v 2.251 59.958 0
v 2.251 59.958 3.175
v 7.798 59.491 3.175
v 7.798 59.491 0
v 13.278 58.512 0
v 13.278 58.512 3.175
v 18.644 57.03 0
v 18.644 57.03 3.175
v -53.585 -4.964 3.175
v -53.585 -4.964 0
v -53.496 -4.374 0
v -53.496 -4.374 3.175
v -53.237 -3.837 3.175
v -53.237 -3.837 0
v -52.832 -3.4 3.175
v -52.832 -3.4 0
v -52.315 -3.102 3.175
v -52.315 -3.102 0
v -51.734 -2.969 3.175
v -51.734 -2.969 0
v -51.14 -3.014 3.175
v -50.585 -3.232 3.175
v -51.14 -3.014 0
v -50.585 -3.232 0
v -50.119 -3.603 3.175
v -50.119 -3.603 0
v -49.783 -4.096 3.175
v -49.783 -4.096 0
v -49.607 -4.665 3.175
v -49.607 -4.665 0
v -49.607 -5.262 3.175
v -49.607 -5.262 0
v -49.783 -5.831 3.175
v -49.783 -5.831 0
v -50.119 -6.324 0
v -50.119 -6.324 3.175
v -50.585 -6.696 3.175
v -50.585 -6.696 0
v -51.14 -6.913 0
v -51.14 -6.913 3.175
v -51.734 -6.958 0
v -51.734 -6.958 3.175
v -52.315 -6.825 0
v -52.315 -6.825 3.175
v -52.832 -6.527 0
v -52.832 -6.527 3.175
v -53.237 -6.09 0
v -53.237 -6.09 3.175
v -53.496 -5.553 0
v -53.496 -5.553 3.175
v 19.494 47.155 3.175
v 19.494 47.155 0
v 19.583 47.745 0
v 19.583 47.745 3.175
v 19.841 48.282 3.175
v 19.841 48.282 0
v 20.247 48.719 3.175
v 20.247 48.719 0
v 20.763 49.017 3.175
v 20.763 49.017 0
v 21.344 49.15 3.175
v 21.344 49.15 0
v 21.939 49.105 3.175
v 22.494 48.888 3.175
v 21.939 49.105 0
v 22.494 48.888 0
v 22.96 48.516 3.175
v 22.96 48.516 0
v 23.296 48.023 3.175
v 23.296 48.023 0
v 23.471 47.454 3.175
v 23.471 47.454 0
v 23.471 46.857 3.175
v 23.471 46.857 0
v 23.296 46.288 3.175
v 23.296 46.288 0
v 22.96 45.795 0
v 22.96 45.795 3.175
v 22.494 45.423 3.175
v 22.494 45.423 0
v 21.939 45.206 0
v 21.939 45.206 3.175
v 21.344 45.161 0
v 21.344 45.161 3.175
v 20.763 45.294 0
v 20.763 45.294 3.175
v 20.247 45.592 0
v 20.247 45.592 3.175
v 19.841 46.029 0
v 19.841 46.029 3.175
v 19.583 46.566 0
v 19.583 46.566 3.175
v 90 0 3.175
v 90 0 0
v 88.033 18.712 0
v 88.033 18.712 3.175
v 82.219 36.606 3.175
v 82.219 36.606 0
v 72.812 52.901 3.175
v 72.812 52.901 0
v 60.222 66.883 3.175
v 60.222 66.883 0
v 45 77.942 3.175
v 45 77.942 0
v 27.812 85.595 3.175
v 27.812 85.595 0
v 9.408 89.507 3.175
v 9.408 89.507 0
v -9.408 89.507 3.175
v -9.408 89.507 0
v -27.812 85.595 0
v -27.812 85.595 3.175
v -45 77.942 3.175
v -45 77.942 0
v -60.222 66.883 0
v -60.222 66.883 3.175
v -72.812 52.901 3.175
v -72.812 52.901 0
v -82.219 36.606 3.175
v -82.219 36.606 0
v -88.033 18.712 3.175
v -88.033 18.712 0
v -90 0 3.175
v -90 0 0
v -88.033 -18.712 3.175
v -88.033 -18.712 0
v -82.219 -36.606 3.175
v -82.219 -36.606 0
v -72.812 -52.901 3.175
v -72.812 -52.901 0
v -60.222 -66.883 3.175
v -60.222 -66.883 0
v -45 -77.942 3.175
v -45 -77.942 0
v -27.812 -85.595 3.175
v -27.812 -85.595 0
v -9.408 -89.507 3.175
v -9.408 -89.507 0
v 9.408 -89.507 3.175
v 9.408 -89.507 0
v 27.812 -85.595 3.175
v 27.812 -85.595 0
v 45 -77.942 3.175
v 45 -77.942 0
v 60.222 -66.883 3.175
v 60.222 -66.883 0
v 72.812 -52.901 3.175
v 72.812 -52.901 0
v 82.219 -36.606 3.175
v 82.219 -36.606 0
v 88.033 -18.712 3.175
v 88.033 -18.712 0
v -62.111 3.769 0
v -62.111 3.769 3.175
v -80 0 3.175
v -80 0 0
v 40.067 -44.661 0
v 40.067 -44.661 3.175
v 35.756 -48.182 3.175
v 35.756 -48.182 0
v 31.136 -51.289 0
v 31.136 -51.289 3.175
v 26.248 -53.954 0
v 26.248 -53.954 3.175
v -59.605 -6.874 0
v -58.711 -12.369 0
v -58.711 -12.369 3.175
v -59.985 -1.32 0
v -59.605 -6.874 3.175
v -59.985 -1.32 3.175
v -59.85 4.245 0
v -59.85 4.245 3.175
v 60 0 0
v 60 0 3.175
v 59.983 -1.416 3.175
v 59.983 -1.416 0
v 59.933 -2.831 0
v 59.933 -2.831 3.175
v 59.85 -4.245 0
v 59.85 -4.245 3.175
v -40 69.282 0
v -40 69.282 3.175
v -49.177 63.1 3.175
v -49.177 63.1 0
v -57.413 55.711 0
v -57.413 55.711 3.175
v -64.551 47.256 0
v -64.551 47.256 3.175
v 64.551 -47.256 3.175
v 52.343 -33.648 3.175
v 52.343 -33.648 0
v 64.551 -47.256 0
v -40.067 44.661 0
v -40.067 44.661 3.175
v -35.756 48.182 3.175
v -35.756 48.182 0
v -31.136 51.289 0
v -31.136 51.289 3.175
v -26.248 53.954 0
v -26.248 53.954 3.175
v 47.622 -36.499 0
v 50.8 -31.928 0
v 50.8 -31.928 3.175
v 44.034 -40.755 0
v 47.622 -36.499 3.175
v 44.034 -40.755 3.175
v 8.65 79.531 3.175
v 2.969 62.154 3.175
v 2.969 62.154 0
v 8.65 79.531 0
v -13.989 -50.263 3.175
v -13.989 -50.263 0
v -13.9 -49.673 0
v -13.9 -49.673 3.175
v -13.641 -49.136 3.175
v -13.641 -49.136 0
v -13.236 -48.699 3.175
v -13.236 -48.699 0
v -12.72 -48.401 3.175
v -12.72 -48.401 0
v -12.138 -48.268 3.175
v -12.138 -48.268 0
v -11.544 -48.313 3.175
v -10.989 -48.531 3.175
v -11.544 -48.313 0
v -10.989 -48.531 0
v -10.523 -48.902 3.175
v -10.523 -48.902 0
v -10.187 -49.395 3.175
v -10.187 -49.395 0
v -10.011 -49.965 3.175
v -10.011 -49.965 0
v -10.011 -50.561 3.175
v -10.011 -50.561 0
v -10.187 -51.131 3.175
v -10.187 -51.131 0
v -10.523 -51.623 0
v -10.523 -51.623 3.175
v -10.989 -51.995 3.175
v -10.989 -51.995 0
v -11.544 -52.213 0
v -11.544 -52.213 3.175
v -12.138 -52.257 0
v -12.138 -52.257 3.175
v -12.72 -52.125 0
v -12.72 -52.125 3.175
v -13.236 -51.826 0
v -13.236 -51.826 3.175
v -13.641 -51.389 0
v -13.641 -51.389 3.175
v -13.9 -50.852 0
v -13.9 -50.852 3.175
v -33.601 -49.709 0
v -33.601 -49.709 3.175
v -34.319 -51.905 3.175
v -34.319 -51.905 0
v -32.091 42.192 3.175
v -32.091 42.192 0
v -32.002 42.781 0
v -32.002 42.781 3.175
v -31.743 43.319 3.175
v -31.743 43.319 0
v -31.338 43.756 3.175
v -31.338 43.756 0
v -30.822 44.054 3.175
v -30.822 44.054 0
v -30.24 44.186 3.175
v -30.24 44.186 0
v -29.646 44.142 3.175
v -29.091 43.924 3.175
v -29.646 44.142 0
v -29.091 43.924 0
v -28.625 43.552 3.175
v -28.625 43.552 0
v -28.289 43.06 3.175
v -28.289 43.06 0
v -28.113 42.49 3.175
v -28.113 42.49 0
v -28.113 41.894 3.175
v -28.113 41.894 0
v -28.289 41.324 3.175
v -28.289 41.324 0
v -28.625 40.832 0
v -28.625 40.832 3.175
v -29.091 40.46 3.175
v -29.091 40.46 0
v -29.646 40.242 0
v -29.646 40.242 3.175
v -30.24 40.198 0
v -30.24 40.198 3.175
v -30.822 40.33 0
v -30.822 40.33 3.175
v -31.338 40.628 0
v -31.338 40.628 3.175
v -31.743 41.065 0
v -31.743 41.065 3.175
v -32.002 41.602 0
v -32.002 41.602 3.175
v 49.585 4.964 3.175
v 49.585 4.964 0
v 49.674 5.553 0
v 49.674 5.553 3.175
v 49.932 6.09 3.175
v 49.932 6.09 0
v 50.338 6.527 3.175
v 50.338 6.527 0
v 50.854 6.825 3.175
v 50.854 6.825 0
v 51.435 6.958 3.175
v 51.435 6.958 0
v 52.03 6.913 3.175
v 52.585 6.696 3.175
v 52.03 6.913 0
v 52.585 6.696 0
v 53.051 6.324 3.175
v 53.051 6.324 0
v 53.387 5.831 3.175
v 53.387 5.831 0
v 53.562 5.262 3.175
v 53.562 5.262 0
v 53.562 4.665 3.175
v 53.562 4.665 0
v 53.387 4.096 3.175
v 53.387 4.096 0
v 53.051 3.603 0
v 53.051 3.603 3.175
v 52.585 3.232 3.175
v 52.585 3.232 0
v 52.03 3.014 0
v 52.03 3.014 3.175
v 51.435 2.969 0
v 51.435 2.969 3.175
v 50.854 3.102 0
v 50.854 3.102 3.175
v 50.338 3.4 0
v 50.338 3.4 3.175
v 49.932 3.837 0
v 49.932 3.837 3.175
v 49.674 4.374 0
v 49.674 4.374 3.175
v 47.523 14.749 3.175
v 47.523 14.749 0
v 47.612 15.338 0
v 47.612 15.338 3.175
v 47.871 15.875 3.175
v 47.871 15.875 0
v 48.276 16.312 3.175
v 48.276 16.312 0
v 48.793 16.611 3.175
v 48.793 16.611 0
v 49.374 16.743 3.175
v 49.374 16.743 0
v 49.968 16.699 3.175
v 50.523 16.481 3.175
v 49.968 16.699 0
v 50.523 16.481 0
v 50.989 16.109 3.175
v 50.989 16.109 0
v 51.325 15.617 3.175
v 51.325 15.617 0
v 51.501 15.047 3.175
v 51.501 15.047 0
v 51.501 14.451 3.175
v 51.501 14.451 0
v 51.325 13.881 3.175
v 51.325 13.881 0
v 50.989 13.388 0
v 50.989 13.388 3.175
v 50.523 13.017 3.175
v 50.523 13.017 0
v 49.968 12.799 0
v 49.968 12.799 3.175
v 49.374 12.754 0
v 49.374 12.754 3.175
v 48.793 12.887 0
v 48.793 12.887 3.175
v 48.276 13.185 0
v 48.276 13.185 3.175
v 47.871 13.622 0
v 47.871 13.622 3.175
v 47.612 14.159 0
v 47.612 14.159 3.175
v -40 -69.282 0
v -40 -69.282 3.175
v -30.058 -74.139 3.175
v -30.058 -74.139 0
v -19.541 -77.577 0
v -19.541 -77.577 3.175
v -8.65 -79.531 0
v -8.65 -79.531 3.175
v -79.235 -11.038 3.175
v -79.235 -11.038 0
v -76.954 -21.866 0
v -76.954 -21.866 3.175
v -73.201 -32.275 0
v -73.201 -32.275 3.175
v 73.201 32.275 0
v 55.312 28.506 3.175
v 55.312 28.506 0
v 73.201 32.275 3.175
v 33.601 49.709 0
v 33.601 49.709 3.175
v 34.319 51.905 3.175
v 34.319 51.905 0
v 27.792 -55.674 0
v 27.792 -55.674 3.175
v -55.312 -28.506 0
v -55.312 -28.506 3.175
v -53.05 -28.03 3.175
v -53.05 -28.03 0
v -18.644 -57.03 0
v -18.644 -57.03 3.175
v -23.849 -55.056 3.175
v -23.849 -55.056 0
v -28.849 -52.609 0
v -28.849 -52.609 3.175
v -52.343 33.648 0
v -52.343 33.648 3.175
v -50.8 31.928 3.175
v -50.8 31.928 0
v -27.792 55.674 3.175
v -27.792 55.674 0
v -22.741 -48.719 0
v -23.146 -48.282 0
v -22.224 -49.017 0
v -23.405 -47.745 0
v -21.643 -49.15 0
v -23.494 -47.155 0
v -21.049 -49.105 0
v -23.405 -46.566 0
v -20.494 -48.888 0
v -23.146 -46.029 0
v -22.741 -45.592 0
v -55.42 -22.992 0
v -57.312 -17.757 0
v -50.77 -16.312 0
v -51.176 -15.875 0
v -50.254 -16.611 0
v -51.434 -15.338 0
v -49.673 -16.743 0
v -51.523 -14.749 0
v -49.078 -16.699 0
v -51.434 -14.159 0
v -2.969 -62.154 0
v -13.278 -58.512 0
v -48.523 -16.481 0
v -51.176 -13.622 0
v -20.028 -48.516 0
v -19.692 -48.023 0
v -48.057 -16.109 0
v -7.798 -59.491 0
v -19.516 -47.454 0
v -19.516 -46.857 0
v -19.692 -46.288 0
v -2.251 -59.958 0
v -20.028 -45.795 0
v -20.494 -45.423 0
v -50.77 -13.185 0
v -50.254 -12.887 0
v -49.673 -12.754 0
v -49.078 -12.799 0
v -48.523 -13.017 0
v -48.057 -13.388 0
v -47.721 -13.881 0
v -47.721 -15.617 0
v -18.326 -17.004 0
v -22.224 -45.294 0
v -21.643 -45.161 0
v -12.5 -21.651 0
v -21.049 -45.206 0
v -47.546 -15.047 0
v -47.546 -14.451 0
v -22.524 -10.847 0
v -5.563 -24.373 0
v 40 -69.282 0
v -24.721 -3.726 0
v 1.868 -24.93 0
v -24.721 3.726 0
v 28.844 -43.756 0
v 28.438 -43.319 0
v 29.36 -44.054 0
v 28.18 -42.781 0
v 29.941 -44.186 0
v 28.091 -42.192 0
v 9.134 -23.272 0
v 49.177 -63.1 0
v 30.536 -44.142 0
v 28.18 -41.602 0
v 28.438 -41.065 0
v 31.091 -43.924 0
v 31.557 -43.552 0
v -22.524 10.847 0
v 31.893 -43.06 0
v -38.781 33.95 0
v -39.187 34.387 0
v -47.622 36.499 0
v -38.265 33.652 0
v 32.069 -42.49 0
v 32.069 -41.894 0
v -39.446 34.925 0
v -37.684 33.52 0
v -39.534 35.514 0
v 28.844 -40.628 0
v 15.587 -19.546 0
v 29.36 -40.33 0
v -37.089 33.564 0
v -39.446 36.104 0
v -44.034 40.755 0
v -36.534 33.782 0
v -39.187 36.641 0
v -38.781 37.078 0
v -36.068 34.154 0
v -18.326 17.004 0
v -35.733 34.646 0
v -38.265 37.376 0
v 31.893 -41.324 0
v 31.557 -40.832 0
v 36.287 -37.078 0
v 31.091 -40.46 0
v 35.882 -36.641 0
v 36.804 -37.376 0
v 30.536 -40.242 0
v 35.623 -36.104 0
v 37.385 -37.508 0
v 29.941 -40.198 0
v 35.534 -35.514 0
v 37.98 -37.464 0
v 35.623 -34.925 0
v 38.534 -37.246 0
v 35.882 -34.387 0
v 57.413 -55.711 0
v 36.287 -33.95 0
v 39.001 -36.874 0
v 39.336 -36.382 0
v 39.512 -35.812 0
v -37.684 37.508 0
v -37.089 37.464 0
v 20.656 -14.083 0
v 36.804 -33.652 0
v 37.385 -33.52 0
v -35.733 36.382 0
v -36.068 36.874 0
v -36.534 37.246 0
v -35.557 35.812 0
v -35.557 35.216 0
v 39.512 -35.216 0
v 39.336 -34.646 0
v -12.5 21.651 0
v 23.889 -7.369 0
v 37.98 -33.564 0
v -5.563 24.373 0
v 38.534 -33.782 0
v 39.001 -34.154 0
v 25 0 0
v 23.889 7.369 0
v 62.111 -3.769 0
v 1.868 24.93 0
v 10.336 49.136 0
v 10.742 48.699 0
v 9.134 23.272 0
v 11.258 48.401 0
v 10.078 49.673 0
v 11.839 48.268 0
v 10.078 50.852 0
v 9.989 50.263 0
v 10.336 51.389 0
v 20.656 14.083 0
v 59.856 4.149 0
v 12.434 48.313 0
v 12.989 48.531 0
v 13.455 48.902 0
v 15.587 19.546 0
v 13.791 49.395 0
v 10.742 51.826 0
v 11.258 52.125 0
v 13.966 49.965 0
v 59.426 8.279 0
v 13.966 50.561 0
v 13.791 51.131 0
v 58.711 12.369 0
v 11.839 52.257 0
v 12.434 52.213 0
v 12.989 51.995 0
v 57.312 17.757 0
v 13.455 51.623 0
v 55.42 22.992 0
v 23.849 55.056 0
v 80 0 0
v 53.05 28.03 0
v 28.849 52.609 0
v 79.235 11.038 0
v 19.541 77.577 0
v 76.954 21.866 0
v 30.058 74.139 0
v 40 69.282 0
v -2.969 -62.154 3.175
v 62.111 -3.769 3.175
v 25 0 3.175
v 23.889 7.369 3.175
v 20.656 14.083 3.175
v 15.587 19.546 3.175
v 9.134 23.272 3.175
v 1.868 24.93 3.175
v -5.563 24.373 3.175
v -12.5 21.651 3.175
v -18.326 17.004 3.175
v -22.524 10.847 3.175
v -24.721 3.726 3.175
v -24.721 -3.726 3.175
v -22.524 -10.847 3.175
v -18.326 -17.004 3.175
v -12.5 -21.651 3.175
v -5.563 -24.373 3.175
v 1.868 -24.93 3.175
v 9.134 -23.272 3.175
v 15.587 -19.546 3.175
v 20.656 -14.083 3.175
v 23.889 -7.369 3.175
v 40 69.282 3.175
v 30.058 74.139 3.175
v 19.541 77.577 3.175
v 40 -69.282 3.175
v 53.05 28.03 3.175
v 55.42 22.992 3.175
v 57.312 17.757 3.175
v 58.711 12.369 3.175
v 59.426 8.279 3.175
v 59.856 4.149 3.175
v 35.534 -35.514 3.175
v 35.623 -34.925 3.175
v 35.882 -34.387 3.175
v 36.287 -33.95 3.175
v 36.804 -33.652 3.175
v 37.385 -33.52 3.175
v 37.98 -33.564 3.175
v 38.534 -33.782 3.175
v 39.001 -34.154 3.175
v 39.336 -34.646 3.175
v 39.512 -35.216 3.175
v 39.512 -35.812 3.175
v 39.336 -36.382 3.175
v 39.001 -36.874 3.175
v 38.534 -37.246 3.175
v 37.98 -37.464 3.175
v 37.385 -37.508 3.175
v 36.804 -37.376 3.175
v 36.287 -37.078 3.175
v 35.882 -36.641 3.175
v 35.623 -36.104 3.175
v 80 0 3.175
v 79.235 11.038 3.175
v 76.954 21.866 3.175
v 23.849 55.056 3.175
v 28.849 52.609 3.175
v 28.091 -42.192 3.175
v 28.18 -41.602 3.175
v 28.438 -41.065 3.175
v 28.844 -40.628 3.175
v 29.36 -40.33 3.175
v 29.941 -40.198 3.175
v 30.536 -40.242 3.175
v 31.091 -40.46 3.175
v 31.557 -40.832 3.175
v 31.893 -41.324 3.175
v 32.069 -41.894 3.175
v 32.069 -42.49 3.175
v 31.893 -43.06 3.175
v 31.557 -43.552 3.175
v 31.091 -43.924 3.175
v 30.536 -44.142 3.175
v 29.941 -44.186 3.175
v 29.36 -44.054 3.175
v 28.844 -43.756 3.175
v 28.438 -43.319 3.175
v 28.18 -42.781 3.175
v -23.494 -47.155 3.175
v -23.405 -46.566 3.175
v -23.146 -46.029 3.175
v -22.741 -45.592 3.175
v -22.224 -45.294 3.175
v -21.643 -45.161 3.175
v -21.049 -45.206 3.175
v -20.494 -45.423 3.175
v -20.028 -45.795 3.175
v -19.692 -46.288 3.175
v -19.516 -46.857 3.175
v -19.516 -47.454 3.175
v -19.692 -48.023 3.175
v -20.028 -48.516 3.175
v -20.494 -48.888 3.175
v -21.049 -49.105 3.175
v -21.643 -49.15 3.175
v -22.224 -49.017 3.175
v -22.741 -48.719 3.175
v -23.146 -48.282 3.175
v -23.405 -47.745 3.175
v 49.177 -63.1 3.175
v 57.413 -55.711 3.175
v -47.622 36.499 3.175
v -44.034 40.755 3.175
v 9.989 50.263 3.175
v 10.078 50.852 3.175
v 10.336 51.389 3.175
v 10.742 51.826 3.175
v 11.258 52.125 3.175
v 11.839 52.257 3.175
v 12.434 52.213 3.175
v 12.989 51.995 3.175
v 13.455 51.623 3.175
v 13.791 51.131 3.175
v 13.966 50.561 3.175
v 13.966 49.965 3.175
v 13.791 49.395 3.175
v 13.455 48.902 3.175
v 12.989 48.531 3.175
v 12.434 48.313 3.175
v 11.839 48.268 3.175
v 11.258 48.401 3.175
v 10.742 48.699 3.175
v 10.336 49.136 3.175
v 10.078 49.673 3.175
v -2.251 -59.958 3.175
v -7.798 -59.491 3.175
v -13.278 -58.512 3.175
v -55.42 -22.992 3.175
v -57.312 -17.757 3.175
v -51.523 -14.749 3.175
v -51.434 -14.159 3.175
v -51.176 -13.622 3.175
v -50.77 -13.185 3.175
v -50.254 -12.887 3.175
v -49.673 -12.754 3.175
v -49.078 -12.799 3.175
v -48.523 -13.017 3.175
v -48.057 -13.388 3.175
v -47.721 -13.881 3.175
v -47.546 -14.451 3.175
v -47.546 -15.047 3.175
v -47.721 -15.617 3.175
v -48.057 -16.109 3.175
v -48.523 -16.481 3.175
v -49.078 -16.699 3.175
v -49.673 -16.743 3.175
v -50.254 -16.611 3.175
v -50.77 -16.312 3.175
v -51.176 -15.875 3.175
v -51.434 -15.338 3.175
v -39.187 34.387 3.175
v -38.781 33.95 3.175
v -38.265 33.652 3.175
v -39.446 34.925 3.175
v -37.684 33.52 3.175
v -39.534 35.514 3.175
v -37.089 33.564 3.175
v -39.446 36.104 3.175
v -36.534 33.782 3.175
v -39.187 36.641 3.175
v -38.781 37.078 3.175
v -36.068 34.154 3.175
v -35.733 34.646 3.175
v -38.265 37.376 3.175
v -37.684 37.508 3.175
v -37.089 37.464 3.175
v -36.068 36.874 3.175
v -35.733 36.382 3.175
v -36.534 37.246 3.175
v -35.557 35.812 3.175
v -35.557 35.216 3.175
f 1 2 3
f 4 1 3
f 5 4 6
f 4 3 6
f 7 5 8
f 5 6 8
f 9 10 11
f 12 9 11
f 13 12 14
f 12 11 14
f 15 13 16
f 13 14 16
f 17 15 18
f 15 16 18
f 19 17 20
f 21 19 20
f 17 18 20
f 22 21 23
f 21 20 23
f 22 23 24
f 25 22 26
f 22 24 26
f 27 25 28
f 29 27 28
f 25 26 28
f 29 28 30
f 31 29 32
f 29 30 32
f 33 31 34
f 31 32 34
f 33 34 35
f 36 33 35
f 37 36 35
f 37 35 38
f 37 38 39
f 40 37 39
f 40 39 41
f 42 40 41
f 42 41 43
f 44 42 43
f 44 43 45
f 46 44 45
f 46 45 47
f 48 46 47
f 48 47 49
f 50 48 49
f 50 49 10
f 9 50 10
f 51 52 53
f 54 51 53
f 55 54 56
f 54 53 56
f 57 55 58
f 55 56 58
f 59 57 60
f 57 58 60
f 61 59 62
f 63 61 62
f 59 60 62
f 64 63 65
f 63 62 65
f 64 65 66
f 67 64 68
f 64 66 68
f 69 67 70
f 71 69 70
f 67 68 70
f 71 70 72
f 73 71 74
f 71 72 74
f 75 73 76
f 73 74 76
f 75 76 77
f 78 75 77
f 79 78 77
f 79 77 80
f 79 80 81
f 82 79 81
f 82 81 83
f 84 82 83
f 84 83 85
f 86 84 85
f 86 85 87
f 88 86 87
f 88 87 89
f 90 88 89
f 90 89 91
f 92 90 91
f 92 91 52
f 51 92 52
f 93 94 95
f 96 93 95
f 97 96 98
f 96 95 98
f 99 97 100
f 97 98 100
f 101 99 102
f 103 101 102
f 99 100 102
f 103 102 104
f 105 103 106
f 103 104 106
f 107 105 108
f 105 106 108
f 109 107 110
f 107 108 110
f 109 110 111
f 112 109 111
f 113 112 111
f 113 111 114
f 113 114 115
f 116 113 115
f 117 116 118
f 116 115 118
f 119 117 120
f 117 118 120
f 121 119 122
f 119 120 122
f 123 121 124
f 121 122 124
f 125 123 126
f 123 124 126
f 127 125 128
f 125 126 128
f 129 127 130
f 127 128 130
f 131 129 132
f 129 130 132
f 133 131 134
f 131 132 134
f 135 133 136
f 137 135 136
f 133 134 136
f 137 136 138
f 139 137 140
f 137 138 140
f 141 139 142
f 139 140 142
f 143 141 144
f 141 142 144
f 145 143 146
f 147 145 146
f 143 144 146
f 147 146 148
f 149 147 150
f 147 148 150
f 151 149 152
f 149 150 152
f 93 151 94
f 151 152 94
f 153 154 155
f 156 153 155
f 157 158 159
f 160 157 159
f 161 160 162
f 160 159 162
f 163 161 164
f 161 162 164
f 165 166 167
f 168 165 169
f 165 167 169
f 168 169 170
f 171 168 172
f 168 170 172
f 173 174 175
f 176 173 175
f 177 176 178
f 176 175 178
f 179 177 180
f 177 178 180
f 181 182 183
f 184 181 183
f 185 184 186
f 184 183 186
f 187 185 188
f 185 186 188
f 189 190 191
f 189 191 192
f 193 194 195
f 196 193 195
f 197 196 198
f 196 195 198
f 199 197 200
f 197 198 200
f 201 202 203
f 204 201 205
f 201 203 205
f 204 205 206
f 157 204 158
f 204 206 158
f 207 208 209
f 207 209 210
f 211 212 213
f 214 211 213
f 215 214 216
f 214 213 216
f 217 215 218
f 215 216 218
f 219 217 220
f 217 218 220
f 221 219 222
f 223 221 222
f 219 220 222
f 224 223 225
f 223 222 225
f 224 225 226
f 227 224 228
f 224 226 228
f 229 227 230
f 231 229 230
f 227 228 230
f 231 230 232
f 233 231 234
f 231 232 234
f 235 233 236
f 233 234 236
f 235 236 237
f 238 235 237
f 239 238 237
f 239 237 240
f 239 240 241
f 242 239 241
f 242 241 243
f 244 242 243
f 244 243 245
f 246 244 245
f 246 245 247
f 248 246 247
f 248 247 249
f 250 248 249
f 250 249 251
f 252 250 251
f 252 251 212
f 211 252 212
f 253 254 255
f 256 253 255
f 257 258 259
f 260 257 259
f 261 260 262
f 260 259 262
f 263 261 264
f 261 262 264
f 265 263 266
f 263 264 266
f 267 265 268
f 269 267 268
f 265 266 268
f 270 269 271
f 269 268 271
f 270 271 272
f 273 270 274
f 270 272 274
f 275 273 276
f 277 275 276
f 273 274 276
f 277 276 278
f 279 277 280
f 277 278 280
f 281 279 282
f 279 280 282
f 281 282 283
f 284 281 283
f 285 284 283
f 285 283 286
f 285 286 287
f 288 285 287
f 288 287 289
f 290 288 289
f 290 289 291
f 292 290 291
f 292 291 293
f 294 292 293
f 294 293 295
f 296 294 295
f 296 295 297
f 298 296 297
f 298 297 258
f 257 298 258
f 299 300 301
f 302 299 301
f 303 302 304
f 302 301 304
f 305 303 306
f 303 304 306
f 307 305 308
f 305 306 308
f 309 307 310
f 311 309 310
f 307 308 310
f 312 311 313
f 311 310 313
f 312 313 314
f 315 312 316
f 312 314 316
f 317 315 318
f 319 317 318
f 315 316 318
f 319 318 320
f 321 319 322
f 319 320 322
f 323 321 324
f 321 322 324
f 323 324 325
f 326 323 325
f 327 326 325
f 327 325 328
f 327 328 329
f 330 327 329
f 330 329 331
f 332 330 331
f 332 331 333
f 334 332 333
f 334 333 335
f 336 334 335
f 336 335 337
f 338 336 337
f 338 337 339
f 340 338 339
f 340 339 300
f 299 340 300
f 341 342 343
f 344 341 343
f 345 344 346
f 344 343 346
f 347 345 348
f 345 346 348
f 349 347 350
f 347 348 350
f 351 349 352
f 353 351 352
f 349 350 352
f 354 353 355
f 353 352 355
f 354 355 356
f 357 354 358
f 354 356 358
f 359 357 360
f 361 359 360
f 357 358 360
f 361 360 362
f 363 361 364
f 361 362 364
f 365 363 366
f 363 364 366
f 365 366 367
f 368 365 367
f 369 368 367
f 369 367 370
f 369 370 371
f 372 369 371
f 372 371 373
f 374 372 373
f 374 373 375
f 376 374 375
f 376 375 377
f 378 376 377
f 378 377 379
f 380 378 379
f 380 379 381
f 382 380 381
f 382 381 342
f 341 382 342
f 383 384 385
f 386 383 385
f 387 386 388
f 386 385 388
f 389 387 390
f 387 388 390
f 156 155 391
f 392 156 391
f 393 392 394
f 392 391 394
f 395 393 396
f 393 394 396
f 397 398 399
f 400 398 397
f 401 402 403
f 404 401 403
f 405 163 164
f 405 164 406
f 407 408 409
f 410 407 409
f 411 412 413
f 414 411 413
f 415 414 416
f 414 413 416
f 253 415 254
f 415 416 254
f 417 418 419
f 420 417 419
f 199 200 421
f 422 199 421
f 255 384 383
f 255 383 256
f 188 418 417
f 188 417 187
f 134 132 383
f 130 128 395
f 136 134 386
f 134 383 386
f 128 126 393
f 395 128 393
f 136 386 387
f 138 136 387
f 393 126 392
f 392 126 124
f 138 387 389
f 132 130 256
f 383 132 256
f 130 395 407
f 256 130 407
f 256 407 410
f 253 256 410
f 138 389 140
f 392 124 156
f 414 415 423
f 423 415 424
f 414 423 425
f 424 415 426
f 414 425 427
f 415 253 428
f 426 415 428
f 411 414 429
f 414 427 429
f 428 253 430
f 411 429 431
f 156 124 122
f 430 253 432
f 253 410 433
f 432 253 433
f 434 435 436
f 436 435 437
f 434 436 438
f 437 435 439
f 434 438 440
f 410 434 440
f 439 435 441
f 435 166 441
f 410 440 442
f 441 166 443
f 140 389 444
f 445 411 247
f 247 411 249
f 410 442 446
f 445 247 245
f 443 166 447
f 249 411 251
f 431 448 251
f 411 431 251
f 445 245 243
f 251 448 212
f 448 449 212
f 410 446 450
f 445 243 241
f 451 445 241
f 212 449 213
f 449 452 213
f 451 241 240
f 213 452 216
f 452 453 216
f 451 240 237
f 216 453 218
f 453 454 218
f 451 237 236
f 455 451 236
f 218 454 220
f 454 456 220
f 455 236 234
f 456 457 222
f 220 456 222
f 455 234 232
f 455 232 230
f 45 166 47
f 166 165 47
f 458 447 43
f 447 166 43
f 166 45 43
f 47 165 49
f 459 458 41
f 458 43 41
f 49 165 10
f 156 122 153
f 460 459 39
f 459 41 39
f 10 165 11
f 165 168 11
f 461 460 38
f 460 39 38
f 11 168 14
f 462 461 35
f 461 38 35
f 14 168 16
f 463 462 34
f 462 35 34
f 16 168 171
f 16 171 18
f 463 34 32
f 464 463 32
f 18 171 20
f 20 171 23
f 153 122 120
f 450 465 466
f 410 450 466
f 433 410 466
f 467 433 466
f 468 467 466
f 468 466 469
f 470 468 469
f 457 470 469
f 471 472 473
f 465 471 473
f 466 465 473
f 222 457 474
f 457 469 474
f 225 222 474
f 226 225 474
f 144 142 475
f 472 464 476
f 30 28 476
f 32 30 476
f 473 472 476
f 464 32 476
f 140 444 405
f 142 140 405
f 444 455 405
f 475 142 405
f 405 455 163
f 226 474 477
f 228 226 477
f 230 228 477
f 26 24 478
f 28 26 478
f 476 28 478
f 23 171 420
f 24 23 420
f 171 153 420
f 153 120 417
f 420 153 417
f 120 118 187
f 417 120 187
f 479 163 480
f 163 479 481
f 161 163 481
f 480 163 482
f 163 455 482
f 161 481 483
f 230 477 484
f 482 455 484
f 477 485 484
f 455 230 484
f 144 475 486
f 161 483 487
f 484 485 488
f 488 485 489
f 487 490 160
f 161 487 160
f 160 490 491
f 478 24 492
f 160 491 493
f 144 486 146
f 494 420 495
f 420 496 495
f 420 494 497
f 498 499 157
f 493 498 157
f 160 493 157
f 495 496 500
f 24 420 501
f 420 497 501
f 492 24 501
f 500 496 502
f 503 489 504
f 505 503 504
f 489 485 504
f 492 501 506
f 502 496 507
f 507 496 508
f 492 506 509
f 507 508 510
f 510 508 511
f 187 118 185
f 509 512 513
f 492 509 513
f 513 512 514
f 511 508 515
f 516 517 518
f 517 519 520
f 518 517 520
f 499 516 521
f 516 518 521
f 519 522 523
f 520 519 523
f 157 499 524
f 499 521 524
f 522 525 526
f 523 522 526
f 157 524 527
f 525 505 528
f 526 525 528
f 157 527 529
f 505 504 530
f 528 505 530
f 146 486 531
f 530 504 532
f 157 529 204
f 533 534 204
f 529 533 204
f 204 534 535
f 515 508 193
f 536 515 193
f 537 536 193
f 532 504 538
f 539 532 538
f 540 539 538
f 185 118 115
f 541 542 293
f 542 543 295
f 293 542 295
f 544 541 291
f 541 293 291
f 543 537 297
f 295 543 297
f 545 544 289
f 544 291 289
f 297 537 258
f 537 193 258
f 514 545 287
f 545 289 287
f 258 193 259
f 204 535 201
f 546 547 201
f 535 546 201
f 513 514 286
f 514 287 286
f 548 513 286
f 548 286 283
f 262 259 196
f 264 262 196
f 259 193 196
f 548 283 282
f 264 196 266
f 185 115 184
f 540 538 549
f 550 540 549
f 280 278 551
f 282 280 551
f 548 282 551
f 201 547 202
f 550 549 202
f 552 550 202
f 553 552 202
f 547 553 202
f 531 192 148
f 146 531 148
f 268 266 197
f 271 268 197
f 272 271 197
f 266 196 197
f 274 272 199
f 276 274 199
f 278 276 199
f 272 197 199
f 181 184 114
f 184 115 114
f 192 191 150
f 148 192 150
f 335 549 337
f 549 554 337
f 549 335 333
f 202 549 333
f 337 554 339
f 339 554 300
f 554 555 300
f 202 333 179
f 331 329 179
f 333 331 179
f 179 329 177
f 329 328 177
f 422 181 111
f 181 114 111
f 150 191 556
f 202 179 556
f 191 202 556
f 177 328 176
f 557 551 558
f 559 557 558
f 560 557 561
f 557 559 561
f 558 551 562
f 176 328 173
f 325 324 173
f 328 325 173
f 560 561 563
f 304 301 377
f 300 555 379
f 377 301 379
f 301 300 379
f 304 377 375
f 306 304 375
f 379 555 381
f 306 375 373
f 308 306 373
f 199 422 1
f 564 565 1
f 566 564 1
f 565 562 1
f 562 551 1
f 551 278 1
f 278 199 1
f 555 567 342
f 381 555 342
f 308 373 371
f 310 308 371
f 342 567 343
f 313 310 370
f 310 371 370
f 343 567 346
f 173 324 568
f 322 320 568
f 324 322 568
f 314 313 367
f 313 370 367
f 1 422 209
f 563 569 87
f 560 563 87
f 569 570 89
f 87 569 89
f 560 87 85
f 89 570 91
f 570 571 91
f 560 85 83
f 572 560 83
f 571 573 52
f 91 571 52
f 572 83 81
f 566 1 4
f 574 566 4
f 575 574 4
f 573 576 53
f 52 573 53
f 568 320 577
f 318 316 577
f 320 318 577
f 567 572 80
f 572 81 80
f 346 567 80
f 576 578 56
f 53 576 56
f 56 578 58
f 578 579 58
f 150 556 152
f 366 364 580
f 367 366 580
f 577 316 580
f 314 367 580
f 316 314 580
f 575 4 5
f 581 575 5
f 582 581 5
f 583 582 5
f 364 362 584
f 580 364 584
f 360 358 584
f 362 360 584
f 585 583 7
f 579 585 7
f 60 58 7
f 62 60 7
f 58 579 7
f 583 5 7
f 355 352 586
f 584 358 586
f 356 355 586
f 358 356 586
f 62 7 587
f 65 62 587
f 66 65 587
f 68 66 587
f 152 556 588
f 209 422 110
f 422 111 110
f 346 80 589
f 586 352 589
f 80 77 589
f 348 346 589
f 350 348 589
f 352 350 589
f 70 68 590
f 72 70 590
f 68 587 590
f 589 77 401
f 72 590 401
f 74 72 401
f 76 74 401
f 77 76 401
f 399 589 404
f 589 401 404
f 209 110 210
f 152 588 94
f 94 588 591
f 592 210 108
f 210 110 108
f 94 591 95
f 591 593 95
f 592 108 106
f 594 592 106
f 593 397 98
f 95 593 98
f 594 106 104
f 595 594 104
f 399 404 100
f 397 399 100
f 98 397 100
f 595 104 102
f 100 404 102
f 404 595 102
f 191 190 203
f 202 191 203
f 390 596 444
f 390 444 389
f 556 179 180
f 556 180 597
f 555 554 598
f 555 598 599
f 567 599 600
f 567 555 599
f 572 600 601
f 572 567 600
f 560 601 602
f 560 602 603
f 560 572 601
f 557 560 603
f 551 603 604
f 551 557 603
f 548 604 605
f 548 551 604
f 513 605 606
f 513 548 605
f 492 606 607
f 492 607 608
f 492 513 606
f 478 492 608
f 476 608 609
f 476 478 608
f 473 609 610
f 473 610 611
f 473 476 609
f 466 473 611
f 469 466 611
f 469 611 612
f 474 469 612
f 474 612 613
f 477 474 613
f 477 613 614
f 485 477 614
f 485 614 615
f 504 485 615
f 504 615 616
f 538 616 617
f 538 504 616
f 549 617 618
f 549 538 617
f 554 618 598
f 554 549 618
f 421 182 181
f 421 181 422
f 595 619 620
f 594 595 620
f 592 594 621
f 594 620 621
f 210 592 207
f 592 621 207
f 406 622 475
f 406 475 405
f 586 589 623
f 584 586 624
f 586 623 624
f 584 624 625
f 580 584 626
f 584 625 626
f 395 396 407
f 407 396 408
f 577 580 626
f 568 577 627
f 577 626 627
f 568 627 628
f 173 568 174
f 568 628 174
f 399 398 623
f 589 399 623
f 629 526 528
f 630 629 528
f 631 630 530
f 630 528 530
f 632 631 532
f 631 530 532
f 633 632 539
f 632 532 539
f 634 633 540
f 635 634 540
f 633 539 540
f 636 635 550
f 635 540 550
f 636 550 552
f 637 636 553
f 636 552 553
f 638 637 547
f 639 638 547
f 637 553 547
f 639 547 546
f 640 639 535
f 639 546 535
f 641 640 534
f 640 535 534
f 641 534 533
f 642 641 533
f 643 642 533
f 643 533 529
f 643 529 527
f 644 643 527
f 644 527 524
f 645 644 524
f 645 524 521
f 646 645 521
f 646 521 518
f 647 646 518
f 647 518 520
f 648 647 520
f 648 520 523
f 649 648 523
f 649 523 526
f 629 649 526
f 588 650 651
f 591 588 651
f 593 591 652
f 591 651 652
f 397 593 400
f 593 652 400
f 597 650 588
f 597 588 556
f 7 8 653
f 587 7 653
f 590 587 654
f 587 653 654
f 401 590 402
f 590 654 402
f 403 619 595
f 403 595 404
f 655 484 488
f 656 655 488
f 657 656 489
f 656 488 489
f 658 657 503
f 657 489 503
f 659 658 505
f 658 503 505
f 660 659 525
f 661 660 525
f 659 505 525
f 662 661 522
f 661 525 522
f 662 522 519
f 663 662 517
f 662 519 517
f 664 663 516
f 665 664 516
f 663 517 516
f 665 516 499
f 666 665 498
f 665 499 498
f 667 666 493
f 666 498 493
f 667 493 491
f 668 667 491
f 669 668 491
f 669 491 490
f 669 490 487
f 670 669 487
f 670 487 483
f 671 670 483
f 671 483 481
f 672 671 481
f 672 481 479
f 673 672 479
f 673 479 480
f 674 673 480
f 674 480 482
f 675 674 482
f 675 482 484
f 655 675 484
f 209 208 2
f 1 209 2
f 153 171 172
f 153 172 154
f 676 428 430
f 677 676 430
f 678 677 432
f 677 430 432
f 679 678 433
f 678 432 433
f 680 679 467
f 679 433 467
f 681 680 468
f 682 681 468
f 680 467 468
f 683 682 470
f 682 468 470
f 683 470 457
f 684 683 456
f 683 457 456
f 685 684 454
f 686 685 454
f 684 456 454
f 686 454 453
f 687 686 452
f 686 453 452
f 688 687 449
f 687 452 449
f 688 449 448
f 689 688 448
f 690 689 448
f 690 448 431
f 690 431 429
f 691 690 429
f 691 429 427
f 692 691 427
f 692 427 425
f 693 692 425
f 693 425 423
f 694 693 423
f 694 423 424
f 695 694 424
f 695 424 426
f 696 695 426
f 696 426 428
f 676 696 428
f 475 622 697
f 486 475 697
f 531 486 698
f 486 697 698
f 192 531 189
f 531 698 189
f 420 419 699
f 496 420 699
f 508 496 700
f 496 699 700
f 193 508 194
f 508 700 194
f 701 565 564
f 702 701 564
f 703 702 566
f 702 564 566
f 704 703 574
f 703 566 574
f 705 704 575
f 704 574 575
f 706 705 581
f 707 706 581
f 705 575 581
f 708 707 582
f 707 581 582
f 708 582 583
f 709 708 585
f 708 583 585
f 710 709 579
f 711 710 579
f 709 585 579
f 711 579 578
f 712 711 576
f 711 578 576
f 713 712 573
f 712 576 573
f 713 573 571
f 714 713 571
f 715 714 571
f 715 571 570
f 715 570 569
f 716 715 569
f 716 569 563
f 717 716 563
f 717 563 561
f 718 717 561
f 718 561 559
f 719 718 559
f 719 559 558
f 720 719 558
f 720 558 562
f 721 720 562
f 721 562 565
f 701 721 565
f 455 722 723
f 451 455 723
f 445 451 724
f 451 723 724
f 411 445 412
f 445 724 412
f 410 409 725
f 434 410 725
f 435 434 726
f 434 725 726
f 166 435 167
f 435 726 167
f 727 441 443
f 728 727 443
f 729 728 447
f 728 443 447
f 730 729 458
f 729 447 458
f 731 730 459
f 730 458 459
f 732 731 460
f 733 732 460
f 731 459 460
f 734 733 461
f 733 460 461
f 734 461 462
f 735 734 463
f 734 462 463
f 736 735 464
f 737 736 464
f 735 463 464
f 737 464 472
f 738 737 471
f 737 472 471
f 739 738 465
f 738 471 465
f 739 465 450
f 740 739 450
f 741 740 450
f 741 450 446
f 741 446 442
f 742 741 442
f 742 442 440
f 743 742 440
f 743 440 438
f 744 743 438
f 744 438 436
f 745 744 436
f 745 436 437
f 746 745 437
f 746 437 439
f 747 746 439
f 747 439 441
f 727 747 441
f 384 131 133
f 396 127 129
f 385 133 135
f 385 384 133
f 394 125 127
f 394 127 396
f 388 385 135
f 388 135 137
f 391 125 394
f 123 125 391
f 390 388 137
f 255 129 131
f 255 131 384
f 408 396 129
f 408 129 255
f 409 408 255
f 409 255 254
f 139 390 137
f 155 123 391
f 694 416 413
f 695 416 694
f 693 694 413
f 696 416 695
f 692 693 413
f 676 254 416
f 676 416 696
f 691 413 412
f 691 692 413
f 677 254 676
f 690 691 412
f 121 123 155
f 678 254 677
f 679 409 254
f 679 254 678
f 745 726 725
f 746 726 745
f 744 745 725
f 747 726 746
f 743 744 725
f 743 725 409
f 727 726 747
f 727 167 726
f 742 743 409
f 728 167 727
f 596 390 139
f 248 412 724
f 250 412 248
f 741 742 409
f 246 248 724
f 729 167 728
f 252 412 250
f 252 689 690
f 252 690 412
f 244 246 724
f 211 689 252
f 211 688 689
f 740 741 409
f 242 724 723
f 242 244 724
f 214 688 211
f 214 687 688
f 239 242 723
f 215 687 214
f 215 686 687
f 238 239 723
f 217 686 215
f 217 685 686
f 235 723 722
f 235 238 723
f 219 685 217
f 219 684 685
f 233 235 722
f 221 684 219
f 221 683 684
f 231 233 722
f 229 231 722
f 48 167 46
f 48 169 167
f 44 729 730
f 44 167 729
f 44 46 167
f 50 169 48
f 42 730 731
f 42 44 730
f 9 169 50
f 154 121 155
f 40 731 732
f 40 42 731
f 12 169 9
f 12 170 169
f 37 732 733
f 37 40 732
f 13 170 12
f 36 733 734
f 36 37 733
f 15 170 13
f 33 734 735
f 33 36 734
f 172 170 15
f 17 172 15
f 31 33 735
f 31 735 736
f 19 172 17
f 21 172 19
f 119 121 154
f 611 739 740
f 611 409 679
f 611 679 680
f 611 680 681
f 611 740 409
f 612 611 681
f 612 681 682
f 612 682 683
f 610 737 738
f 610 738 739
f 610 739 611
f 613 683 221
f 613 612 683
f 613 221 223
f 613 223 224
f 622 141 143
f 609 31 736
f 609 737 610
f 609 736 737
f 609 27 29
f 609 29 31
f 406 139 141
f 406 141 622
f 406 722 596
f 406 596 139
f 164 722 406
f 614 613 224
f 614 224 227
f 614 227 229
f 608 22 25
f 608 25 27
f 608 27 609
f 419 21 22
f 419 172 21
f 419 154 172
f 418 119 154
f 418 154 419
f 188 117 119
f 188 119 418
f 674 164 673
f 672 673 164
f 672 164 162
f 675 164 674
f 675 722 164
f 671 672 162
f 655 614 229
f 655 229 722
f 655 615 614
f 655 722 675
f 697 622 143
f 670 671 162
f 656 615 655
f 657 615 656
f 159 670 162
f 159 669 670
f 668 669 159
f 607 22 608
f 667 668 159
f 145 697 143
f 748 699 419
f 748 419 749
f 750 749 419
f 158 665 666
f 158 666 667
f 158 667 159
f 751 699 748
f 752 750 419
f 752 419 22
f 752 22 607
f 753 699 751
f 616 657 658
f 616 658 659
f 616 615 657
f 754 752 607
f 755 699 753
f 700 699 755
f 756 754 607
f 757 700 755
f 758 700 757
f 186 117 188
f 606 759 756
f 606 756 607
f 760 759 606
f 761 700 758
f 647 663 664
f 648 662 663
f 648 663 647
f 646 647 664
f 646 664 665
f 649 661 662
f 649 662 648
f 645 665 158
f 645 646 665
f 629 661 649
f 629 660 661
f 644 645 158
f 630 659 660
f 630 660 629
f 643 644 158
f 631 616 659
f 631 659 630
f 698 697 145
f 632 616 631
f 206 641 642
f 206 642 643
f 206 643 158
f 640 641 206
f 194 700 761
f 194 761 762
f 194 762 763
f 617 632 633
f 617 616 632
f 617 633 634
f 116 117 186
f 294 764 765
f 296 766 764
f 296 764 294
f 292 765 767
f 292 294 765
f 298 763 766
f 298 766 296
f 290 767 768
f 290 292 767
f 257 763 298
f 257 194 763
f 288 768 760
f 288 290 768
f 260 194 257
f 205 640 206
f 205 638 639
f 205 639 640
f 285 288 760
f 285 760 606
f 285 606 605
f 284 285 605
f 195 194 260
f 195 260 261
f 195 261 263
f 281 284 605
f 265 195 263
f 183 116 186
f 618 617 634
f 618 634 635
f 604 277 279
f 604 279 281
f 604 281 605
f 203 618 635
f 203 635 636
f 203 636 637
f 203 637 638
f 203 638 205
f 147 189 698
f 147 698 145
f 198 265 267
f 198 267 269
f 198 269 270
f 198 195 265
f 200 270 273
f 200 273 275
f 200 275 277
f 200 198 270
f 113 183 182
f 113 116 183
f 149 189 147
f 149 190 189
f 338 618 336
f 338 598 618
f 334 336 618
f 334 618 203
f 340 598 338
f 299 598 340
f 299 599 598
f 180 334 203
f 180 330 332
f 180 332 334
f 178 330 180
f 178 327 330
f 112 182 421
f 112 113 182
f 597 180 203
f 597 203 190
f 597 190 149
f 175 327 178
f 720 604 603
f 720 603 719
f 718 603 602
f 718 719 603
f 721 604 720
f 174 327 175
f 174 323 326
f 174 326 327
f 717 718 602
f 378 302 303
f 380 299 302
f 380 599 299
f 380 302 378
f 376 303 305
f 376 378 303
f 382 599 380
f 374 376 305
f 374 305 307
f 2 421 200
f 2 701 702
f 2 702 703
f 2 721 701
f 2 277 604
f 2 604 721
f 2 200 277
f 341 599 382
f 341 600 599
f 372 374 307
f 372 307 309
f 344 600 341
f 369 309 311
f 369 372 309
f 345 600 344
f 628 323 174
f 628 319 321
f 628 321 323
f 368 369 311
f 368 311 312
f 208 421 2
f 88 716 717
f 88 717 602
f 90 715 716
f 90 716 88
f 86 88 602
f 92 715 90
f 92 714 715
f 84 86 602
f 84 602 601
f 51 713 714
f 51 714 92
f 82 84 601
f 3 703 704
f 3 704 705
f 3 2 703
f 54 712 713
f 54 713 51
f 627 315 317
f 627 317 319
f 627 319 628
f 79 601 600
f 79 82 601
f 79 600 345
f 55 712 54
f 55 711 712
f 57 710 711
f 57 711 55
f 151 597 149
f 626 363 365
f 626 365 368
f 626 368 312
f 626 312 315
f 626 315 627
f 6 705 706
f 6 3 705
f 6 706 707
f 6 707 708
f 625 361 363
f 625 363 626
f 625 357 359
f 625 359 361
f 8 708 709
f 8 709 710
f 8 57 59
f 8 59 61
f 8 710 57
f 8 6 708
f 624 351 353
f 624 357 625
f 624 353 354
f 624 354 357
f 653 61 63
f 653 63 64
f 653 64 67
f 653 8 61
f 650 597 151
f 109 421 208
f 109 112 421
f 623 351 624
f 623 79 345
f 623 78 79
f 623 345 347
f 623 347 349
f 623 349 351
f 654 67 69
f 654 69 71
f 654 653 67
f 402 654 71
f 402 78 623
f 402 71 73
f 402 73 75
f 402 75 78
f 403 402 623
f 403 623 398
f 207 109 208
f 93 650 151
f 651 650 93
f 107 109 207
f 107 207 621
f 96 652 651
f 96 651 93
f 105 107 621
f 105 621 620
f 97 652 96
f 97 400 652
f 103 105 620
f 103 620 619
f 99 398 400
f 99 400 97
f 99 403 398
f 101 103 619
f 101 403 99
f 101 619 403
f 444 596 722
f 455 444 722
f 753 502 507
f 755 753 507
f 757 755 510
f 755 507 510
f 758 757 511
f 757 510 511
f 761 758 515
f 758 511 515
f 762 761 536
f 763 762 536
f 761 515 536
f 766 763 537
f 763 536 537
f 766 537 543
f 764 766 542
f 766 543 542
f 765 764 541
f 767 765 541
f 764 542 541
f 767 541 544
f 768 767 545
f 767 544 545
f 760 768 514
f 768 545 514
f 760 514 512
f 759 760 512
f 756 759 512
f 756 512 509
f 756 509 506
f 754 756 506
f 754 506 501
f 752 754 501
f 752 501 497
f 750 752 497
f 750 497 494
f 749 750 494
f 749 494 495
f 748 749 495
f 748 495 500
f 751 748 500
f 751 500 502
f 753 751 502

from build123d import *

# Parameters (mm, degrees)
SKETCH1_R           = 90
SKETCH1_R_2         = 25
BOSS_EXTRUDE1_DEPTH = 3.175
SKETCH2_R           = 2
CUT_EXTRUDE1_DEPTH  = 128.31881489
CUT_EXTRUDE2_DEPTH  = 128.31881489


with BuildPart() as part:
    # Sketch1 → Boss-Extrude1 (new body)
    with BuildSketch(Plane.XY):
        Circle(SKETCH1_R)
        Circle(SKETCH1_R_2, mode=Mode.SUBTRACT)
    extrude(amount=BOSS_EXTRUDE1_DEPTH)

    # Sketch2 → Cut-Extrude1 (cut, through all)
    with BuildSketch(Plane(origin=(0, 0, 0), x_dir=(-1, 0, 0), z_dir=(0, 0, -1))):
        with Locations((-49.523301376, 14.748786792)):
            Circle(SKETCH2_R)
        with Locations((-51.58474767, 4.963571456)):
            Circle(SKETCH2_R)
        with Locations((-37.534474725, -35.514043674)):
            Circle(SKETCH2_R)
        with Locations((-30.09095281, -42.191916202)):
            Circle(SKETCH2_R)
        with Locations((11.988826651, -50.262830467)):
            Circle(SKETCH2_R)
        with Locations((21.493794861, -47.155487659)):
            Circle(SKETCH2_R)
        with Locations((49.523301376, -14.748786792)):
            Circle(SKETCH2_R)
        with Locations((51.58474767, -4.963571456)):
            Circle(SKETCH2_R)
        with Locations((37.534474725, 35.514043674)):
            Circle(SKETCH2_R)
        with Locations((30.09095281, 42.191916202)):
            Circle(SKETCH2_R)
        with Locations((-21.493794861, 47.155487659)):
            Circle(SKETCH2_R)
        with Locations((-11.988826651, 50.262830467)):
            Circle(SKETCH2_R)
    extrude(amount=-CUT_EXTRUDE1_DEPTH, mode=Mode.SUBTRACT)

    # Sketch3 → Cut-Extrude2 (cut, through all)
    with BuildSketch(Plane.XY.offset(3.175)):
        Polygon((-80, 0), (-73.200702677, -32.27471344), (-55.311643355, -28.50603449), (-62.110940678, 3.76867895), align=None)
        with BuildLine():
            Line((-73.200702677, -32.27471344), (-80, 0))
            ThreePointArc((-80, 0), (-78.281722688, -16.49157036), (-73.200702677, -32.27471344))
        make_face()
        with BuildLine():
            Line((-59.849640055, 4.245065992), (-62.110940678, 3.76867895))
            Line((-62.110940678, 3.76867895), (-58.711292321, -12.368676325))
            ThreePointArc((-58.711292321, -12.368676325), (-59.859650683, -4.101489986), (-59.849640055, 4.245065992))
        make_face()
        with BuildLine():
            ThreePointArc((-53.050342732, -28.029647448), (-56.426786826, -20.396512655), (-58.711292321, -12.368676325))
            Line((-58.711292321, -12.368676325), (-55.311643355, -28.50603449))
            Line((-55.311643355, -28.50603449), (-53.050342732, -28.029647448))
        make_face()
        Polygon((-34.319242049, -51.905313005), (-2.968871648, -62.154305515), (-8.649629599, -79.531024813), (-40, -69.282032303), align=None)
        with BuildLine():
            Line((-33.601155018, -49.708775699), (-34.319242049, -51.905313005))
            Line((-34.319242049, -51.905313005), (-18.644036991, -57.029815752))
            ThreePointArc((-18.644036991, -57.029815752), (-26.377820776, -53.890728063), (-33.601155018, -49.708775699))
        make_face()
        with BuildLine():
            ThreePointArc((-2.250784617, -59.957768209), (-10.549484296, -59.065289139), (-18.644036991, -57.029815752))
            Line((-18.644036991, -57.029815752), (-2.968871648, -62.154305515))
            Line((-2.968871648, -62.154305515), (-2.250784617, -59.957768209))
        make_face()
        with BuildLine():
            Line((-8.649629599, -79.531024813), (-40, -69.282032303))
            ThreePointArc((-40, -69.282032303), (-24.858742464, -76.03974568), (-8.649629599, -79.531024813))
        make_face()
        Polygon((27.791698629, -55.673991955), (52.342771707, -33.648271025), (64.551073077, -47.256311373), (40, -69.282032303), align=None)
        with BuildLine():
            Line((26.248485037, -53.953841691), (27.791698629, -55.673991955))
            Line((27.791698629, -55.673991955), (40.067235173, -44.661131486))
            ThreePointArc((40.067235173, -44.661131486), (33.481820478, -49.789232747), (26.248485037, -53.953841691))
        make_face()
        with BuildLine():
            ThreePointArc((50.799558115, -31.928120761), (45.877291999, -38.668773951), (40.067235173, -44.661131486))
            Line((40.067235173, -44.661131486), (52.342771707, -33.648271025))
            Line((52.342771707, -33.648271025), (50.799558115, -31.928120761))
        make_face()
        with BuildLine():
            Line((64.551073077, -47.256311373), (40, -69.282032303))
            ThreePointArc((40, -69.282032303), (53.422980224, -59.54817532), (64.551073077, -47.256311373))
        make_face()
        Polygon((62.110940678, -3.76867895), (55.311643355, 28.50603449), (73.200702677, 32.27471344), (80, 0), align=None)
        with BuildLine():
            Line((58.711292095, 12.368677398), (55.311643355, 28.50603449))
            Line((55.311643355, 28.50603449), (53.050342732, 28.029647448))
            ThreePointArc((53.050342732, 28.029647448), (56.42678664, 20.39651317), (58.711292095, 12.368677398))
        make_face()
        with BuildLine():
            Line((59.849640055, -4.245065992), (62.110940678, -3.76867895))
            Line((62.110940678, -3.76867895), (58.711292095, 12.368677398))
            ThreePointArc((58.711292095, 12.368677398), (59.676953364, 6.217816108), (60, 0))
            ThreePointArc((60, 0), (59.962398231, -2.123864014), (59.849640055, -4.245065992))
        make_face()
        with BuildLine():
            ThreePointArc((80, 0), (78.281722688, 16.49157036), (73.200702677, 32.27471344))
            Line((73.200702677, 32.27471344), (80, 0))
        make_face()
        Polygon((-27.791698629, 55.673991955), (-52.342771707, 33.648271025), (-64.551073077, 47.256311373), (-40, 69.282032303), align=None)
        Polygon((34.319242049, 51.905313005), (2.968871648, 62.154305515), (8.649629599, 79.531024813), (40, 69.282032303), align=None)
        with BuildLine():
            Line((18.644056811, 57.029809272), (2.968871648, 62.154305515))
            Line((2.968871648, 62.154305515), (2.250784617, 59.957768209))
            ThreePointArc((2.250784617, 59.957768209), (10.54949456, 59.065287306), (18.644056811, 57.029809272))
        make_face()
        with BuildLine():
            Line((33.601155018, 49.708775699), (34.319242049, 51.905313005))
            Line((34.319242049, 51.905313005), (18.644056811, 57.029809272))
            ThreePointArc((18.644056811, 57.029809272), (26.37783014, 53.890723479), (33.601155018, 49.708775699))
        make_face()
        with BuildLine():
            ThreePointArc((40, 69.282032303), (24.858742464, 76.03974568), (8.649629599, 79.531024813))
            Line((8.649629599, 79.531024813), (40, 69.282032303))
        make_face()
        with BuildLine():
            ThreePointArc((-40, 69.282032303), (-53.422980224, 59.54817532), (-64.551073077, 47.256311373))
            Line((-64.551073077, 47.256311373), (-40, 69.282032303))
        make_face()
        with BuildLine():
            Line((-40.067234967, 44.661131671), (-52.342771707, 33.648271025))
            Line((-52.342771707, 33.648271025), (-50.799558115, 31.928120761))
            ThreePointArc((-50.799558115, 31.928120761), (-45.877291909, 38.668774057), (-40.067234967, 44.661131671))
        make_face()
        with BuildLine():
            Line((-26.248485037, 53.953841691), (-27.791698629, 55.673991955))
            Line((-27.791698629, 55.673991955), (-40.067234967, 44.661131671))
            ThreePointArc((-40.067234967, 44.661131671), (-33.481820363, 49.789232824), (-26.248485037, 53.953841691))
        make_face()
    extrude(amount=-CUT_EXTRUDE2_DEPTH, mode=Mode.SUBTRACT)


solid = part.part
